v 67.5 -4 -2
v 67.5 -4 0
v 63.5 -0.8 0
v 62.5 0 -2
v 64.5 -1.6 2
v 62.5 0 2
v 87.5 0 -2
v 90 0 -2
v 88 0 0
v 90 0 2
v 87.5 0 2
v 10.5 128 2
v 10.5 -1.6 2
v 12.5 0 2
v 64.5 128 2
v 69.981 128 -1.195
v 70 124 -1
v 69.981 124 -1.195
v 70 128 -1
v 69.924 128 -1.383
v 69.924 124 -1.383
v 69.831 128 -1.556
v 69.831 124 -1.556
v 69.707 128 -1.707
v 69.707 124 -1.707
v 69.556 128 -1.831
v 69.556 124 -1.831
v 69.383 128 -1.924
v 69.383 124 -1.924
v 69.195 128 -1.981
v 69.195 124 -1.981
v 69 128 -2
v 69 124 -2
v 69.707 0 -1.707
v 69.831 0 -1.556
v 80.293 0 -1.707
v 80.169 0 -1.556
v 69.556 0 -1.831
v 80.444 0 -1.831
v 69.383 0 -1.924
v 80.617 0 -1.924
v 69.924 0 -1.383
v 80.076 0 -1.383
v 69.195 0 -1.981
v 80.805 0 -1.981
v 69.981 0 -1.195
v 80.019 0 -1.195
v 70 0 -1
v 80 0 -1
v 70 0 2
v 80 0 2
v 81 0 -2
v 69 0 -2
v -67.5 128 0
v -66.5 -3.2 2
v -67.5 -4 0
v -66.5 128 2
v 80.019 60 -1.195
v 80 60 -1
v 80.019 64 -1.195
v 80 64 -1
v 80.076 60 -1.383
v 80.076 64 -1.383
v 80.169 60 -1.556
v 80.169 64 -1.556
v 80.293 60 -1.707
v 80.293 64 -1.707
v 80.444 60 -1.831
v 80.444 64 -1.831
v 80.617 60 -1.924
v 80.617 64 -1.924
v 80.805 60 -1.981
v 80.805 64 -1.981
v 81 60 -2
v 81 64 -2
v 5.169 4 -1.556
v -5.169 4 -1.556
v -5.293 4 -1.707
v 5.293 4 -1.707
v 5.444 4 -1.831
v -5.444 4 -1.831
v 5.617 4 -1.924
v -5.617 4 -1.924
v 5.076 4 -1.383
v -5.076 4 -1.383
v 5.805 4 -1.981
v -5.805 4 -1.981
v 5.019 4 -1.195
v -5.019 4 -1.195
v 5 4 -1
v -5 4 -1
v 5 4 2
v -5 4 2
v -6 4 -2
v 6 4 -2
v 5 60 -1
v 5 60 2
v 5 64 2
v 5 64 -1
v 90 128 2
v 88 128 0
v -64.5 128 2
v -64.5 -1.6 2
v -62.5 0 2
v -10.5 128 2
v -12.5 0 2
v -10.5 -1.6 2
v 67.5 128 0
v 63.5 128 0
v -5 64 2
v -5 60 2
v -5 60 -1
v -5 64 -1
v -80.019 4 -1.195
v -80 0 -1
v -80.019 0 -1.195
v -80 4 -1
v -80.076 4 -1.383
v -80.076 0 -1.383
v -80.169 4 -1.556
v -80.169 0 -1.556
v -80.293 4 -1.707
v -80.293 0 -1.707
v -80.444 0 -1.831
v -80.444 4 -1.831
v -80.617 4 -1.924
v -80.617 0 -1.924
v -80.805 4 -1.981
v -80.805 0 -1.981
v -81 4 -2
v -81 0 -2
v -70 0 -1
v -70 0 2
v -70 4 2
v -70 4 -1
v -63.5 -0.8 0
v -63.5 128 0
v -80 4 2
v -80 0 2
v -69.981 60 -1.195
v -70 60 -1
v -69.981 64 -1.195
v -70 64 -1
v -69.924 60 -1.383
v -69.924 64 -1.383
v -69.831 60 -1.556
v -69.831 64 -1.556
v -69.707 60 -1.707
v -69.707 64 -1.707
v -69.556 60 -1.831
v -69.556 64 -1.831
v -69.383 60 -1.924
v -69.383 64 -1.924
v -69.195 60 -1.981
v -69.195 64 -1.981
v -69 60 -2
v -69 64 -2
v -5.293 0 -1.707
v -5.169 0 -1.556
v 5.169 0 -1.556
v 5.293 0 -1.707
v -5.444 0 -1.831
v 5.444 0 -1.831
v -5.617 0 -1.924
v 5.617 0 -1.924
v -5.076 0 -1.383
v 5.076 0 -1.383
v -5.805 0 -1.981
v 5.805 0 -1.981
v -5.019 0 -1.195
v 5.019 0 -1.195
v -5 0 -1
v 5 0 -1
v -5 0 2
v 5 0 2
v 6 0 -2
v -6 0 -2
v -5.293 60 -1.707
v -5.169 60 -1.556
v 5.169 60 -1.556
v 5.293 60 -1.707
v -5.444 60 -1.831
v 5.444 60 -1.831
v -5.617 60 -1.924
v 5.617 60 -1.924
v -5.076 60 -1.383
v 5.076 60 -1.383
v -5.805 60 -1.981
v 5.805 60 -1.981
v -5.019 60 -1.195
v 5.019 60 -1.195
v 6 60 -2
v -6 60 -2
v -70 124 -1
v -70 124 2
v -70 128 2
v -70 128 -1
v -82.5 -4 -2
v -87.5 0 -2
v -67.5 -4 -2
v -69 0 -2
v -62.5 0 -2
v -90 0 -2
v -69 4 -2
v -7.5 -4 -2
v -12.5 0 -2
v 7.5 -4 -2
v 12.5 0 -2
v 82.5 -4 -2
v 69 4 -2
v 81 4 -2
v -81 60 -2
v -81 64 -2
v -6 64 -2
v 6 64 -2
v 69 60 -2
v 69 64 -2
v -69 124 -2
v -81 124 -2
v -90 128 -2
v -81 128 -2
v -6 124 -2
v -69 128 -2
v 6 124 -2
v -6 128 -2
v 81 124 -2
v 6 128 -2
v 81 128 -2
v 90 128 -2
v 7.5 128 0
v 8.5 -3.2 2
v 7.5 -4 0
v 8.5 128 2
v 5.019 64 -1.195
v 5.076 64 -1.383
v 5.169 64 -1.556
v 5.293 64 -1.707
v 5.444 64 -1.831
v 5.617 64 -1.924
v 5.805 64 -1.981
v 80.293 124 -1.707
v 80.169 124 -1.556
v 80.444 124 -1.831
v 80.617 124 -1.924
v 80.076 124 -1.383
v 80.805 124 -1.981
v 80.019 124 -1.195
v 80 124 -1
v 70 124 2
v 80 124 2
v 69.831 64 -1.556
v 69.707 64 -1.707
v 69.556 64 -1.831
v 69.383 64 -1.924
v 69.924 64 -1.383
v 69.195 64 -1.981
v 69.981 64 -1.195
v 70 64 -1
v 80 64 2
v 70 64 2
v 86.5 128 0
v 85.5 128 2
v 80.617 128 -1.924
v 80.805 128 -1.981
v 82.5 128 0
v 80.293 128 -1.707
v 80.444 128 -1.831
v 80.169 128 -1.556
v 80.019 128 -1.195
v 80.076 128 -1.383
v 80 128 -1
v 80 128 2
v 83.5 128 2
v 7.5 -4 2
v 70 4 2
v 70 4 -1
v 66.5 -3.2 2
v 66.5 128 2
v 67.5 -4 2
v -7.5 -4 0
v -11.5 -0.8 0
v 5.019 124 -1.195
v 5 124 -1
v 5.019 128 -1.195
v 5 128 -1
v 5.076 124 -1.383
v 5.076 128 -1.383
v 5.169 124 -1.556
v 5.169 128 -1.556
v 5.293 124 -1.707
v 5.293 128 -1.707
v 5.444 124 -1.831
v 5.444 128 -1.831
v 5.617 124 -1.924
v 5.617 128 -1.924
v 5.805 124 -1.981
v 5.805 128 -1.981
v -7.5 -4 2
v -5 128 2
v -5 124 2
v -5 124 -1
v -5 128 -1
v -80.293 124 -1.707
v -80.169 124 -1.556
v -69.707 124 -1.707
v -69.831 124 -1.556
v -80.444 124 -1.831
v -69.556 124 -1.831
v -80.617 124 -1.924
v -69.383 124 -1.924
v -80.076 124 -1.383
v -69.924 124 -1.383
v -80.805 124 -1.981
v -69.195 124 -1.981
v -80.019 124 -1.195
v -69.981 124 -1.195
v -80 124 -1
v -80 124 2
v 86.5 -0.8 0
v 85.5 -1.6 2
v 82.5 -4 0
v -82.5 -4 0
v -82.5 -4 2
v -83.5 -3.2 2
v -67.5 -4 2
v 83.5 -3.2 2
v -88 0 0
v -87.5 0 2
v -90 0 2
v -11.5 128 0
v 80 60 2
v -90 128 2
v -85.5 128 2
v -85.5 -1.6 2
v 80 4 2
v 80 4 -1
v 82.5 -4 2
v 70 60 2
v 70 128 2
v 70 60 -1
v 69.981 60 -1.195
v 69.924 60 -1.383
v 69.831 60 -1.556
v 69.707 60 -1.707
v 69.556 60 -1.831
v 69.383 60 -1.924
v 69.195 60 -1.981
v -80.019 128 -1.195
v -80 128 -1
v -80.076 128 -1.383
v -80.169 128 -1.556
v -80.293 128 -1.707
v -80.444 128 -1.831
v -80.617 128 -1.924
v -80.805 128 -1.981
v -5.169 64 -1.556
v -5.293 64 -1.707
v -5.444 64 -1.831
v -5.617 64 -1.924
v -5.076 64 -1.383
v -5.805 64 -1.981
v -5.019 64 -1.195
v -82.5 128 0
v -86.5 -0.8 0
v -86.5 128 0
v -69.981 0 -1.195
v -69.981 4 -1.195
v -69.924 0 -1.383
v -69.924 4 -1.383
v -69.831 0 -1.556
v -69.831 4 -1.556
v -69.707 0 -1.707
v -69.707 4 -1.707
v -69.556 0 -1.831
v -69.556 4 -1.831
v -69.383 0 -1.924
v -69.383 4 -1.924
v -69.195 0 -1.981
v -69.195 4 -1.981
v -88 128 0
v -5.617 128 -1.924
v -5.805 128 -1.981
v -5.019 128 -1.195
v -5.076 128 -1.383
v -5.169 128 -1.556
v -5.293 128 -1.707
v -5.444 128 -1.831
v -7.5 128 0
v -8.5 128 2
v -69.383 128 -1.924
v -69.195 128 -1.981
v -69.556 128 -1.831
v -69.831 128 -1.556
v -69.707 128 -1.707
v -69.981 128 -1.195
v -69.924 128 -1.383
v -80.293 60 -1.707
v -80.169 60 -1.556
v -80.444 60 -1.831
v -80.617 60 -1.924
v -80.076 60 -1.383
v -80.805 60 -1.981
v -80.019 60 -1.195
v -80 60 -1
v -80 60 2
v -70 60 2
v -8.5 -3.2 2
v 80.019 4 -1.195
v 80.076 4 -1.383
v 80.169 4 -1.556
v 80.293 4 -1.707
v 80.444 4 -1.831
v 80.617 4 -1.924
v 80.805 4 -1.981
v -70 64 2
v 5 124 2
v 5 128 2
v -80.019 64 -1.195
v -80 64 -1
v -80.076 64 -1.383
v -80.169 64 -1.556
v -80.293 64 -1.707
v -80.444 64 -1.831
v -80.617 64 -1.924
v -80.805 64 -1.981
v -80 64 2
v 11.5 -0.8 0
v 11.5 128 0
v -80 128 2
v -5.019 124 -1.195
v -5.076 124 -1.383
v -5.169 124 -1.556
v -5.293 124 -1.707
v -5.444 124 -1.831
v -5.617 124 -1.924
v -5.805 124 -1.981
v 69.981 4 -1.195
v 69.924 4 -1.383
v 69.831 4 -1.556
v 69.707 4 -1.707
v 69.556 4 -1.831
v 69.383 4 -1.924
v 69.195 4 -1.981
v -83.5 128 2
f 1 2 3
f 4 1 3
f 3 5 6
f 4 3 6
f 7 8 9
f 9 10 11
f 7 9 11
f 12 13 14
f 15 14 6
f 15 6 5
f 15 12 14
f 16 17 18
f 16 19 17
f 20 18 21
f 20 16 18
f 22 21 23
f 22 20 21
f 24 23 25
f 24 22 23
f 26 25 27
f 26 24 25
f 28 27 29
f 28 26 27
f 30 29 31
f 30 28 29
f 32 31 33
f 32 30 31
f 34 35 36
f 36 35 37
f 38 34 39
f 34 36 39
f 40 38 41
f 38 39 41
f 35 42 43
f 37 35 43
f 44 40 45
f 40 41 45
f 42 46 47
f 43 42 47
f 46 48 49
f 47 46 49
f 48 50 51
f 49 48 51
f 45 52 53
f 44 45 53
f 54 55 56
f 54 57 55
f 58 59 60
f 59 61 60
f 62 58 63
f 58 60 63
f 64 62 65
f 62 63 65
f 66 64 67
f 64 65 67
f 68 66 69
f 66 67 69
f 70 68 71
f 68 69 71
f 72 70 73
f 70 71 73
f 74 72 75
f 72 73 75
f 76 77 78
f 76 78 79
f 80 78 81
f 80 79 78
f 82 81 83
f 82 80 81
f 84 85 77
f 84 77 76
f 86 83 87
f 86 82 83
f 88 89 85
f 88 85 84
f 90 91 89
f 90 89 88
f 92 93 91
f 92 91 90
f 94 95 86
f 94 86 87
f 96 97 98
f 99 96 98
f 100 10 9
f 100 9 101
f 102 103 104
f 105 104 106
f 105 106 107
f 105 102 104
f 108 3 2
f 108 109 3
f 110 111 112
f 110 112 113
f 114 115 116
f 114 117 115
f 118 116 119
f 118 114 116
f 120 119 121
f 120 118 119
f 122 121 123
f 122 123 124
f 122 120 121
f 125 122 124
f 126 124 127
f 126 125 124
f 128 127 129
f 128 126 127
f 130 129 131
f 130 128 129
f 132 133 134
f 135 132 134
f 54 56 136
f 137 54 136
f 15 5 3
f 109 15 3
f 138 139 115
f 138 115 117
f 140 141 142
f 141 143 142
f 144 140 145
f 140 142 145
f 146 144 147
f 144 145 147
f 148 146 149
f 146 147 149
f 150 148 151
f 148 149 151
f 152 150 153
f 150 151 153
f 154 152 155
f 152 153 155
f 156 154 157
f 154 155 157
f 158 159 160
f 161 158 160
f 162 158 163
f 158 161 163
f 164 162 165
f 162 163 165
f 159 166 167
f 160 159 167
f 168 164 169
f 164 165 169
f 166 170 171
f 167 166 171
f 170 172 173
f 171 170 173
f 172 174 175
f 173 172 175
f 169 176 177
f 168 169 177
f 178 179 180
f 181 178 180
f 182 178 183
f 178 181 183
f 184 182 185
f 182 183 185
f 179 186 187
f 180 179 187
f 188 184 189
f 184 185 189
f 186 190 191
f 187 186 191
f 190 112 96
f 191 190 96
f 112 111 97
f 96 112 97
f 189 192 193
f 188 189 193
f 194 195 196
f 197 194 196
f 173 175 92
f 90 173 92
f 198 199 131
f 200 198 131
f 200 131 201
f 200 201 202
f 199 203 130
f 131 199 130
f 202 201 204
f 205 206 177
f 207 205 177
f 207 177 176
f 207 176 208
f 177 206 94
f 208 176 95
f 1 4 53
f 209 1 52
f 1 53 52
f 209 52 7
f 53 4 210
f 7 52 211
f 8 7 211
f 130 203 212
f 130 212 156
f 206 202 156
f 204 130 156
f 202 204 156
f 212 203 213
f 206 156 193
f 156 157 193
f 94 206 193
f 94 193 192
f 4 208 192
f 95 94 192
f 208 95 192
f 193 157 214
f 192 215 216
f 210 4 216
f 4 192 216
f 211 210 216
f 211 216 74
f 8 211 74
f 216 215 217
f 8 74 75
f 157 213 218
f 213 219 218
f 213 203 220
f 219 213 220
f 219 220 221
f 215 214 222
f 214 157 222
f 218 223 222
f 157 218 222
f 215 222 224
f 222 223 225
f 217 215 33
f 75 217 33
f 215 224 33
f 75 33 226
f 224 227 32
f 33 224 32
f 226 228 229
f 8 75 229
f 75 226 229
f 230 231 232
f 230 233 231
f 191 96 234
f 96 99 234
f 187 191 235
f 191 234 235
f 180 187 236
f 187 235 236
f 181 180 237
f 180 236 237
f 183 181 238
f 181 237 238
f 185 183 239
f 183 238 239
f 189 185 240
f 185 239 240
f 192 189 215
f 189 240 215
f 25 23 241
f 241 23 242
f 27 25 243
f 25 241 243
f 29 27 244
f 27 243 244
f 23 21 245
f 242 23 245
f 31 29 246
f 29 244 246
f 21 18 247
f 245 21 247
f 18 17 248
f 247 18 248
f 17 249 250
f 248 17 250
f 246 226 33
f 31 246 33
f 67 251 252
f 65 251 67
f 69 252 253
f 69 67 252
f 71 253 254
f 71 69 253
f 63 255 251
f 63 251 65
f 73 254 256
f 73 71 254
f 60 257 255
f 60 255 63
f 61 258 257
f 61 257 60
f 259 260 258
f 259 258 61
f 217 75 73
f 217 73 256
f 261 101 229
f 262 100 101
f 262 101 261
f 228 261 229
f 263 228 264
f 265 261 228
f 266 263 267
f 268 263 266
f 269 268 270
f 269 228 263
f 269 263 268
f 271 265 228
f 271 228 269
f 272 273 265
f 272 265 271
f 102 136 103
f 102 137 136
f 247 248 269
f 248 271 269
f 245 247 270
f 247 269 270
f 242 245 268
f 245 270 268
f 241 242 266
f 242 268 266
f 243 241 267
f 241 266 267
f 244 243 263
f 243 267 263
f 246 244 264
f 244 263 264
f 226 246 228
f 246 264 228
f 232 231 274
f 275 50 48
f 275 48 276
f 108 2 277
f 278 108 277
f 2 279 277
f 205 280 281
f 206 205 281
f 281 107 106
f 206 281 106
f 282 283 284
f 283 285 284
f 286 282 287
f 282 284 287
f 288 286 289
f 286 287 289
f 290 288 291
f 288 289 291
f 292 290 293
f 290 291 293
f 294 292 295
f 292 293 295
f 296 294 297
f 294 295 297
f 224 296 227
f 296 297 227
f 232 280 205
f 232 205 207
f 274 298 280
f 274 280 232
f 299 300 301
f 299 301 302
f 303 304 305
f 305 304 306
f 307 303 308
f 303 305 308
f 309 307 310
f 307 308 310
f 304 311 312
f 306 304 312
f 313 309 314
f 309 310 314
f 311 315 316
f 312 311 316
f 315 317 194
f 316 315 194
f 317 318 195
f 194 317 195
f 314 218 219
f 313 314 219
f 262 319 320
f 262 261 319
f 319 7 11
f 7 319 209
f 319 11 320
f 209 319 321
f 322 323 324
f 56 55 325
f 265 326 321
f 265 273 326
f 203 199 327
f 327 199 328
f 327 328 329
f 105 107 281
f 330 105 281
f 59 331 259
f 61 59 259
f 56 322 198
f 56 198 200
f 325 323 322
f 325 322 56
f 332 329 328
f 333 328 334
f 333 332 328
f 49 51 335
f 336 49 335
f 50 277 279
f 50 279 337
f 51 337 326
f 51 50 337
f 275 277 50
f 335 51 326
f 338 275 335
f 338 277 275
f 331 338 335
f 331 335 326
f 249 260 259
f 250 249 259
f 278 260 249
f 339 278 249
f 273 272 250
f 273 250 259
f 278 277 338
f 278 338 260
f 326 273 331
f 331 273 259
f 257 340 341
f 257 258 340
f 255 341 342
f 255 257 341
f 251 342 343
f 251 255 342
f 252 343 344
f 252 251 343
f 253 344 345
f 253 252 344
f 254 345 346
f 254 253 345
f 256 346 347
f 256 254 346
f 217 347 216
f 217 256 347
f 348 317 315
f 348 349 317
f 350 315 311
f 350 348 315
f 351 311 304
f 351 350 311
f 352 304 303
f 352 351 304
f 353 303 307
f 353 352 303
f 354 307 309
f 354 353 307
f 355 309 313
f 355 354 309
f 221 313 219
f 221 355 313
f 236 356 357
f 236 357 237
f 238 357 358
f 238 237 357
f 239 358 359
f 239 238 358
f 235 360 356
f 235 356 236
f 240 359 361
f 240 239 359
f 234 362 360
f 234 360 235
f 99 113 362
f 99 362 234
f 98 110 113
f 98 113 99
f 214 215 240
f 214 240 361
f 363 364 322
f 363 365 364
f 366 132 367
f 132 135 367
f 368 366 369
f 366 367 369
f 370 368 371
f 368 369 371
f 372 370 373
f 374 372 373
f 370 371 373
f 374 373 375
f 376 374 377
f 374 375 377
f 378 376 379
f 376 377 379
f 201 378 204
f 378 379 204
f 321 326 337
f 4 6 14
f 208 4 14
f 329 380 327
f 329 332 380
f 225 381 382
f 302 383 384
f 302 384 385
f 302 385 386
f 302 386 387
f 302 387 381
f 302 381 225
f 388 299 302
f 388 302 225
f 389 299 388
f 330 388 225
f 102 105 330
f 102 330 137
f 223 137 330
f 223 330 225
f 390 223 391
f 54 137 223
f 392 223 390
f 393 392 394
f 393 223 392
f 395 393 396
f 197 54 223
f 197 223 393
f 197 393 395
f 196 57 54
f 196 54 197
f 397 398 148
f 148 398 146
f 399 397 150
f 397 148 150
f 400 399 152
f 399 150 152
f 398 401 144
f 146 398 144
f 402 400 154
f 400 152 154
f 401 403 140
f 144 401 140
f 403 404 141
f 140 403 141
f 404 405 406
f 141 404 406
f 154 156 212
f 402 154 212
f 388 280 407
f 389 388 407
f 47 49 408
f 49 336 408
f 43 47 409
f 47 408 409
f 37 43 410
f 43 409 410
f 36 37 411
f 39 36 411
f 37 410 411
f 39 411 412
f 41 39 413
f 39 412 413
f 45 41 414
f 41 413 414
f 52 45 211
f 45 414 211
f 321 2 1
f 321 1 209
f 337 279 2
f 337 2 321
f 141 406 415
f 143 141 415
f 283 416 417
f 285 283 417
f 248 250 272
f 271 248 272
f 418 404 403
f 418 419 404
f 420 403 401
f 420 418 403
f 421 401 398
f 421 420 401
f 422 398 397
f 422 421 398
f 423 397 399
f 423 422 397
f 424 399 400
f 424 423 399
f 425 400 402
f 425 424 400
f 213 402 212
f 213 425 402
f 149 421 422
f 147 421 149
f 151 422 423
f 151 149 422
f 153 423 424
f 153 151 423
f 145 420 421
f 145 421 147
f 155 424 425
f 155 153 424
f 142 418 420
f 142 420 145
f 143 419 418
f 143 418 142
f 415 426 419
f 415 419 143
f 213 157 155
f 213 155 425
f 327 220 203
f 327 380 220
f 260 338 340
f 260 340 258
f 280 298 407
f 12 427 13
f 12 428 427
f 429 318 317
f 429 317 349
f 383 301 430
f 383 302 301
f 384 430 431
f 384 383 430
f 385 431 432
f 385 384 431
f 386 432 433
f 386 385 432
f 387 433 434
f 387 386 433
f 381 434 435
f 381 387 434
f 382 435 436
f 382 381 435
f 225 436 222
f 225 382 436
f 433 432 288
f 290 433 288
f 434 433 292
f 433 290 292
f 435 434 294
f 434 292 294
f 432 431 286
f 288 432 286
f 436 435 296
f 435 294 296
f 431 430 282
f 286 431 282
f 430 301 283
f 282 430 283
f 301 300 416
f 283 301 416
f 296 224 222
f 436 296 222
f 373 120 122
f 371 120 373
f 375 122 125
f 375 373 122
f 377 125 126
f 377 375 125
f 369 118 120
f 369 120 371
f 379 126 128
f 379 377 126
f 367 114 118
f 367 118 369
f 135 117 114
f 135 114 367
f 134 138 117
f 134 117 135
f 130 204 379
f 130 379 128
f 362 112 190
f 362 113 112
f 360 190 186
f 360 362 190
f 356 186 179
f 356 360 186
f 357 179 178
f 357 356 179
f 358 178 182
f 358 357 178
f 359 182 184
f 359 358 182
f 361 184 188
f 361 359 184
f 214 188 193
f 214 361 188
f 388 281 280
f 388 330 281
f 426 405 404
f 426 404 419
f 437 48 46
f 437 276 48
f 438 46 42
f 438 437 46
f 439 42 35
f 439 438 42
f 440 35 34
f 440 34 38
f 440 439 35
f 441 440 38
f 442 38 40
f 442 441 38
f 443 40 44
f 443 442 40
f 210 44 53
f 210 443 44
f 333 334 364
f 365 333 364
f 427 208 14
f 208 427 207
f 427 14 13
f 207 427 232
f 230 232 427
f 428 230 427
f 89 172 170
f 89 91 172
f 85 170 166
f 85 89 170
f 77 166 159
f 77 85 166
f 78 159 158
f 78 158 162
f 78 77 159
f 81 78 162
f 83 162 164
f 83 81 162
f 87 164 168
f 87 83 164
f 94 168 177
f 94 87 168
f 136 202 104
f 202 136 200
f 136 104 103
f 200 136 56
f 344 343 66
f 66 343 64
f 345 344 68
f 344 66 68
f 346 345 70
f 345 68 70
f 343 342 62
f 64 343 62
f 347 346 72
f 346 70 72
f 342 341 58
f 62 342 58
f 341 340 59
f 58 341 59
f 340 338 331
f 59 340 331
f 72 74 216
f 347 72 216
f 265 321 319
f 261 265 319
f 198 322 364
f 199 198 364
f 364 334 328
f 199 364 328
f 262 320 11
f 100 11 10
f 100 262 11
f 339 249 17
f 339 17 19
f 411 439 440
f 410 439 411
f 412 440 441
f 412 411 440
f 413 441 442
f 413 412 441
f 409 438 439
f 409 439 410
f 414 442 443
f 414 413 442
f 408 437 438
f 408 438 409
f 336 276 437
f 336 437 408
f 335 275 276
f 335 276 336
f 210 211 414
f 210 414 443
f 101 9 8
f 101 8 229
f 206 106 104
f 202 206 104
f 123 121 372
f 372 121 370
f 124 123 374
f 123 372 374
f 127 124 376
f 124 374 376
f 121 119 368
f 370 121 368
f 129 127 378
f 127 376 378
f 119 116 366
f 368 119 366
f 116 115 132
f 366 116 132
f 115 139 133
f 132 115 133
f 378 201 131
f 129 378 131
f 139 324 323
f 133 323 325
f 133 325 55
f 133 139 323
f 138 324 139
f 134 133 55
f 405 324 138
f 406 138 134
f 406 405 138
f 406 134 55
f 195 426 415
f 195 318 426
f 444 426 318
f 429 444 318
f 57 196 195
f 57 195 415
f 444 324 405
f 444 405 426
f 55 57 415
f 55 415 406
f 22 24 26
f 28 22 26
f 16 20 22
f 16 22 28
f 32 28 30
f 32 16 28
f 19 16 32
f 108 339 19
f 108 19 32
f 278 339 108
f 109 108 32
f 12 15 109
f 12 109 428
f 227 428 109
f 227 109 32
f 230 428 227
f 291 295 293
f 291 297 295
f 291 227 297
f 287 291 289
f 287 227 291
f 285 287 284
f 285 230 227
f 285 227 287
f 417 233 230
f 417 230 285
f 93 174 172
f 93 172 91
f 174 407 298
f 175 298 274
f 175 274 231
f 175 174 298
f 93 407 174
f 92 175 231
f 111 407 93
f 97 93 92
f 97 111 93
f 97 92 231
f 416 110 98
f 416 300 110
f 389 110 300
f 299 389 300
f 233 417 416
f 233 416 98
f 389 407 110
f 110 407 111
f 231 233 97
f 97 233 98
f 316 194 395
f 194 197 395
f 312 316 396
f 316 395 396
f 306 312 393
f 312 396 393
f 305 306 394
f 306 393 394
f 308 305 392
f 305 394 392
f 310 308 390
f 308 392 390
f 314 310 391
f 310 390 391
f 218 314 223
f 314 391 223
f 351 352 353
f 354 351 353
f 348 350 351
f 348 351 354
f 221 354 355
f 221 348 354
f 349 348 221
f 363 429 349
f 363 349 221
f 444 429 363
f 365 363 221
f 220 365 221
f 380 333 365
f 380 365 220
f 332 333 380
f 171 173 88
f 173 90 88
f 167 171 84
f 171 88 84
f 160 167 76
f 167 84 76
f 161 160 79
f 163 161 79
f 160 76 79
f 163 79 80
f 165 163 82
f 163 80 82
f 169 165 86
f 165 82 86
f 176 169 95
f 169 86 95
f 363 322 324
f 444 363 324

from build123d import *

# Parameters (mm, degrees)
SKETCH005_W          = 180
SKETCH005_H          = 132
SKETCH003_W          = 176
SKETCH003_H          = 132
SKETCH004_W          = 180
SKETCH004_H          = 132
SKETCH_W             = 10
SKETCH_H             = 4
POCKET_DEPTH         = 2.001
POCKET_DEPTH_BACK    = 2.001
SKETCH001_W          = 10
SKETCH001_H          = 4
POCKET001_DEPTH      = 2.001
POCKET001_DEPTH_BACK = 2.001
SKETCH002_W          = 10
SKETCH002_H          = 4
POCKET002_DEPTH      = 2.001
POCKET002_DEPTH_BACK = 2.001
POCKET003_DEPTH      = 128.001
POCKET003_DEPTH_BACK = 4.001
POCKET004_DEPTH      = 128.001
POCKET004_DEPTH_BACK = 4.001
POCKET005_DEPTH      = 128.001
POCKET005_DEPTH_BACK = 4.001
FILLET_R             = 1
POCKET006_DEPTH      = 2.001
POCKET006_DEPTH_BACK = 2.001


with BuildPart() as part:
    # Sketch005 (on DatumPlane) → AdditiveLoft section 0
    with BuildSketch(Plane.XY.offset(-2)):
        with Locations((0, 62)):
            Rectangle(SKETCH005_W, SKETCH005_H)
    # Sketch003 → AdditiveLoft section 1
    with BuildSketch(Plane.XY):
        with Locations((0, 62)):
            Rectangle(SKETCH003_W, SKETCH003_H)
    # Sketch004 (on DatumPlane) → AdditiveLoft section 2
    with BuildSketch(Plane.XY.offset(2)):
        with Locations((0, 62)):
            Rectangle(SKETCH004_W, SKETCH004_H)
    loft(ruled=True)

    # Sketch → Pocket (cut, two sides)
    with BuildSketch(Plane.XY) as pocket_sk:
        with Locations((-75, 2)):
            Rectangle(SKETCH_W, SKETCH_H)
        with Locations((0, 2)):
            Rectangle(SKETCH_W, SKETCH_H)
        with Locations((75, 2)):
            Rectangle(SKETCH_W, SKETCH_H)
    extrude(amount=-POCKET_DEPTH, mode=Mode.SUBTRACT)
    extrude(pocket_sk.sketch, amount=POCKET_DEPTH_BACK, mode=Mode.SUBTRACT)

    # Sketch001 (on DatumPlane) → Pocket001 (cut, two sides)
    with BuildSketch(Plane(origin=(0, 60, 0), x_dir=(1, 0, 0), z_dir=(0, 0, 1))) as pocket001_sk:
        with Locations((-75, 2)):
            Rectangle(SKETCH001_W, SKETCH001_H)
        with Locations((0, 2)):
            Rectangle(SKETCH001_W, SKETCH001_H)
        with Locations((75, 2)):
            Rectangle(SKETCH001_W, SKETCH001_H)
    extrude(amount=-POCKET001_DEPTH, mode=Mode.SUBTRACT)
    extrude(pocket001_sk.sketch, amount=POCKET001_DEPTH_BACK, mode=Mode.SUBTRACT)

    # Sketch002 (on DatumPlane) → Pocket002 (cut, two sides)
    with BuildSketch(Plane(origin=(0, 124, 0), x_dir=(1, 0, 0), z_dir=(0, 0, 1))) as pocket002_sk:
        with Locations((-75, 2)):
            Rectangle(SKETCH002_W, SKETCH002_H)
        with Locations((0, 2)):
            Rectangle(SKETCH002_W, SKETCH002_H)
        with Locations((75, 2)):
            Rectangle(SKETCH002_W, SKETCH002_H)
    extrude(amount=-POCKET002_DEPTH, mode=Mode.SUBTRACT)
    extrude(pocket002_sk.sketch, amount=POCKET002_DEPTH_BACK, mode=Mode.SUBTRACT)

    # Sketch006 → Pocket003 (cut, two sides)
    with BuildSketch(Plane.XZ) as pocket003_sk:
        Polygon((-11.5, 0), (-7.5, 0), (-8.5, 2), (-10.5, 2), align=None)
        Polygon((7.5, 0), (11.5, 0), (10.5, 2), (8.5, 2), align=None)
    extrude(amount=-POCKET003_DEPTH, mode=Mode.SUBTRACT)
    extrude(pocket003_sk.sketch, amount=POCKET003_DEPTH_BACK, mode=Mode.SUBTRACT)

    # Sketch007 (on DatumPlane) → Pocket004 (cut, two sides)
    with BuildSketch(Plane(origin=(-75, 0, 0), x_dir=(1, 0, 0), z_dir=(0, -1, 0))) as pocket004_sk:
        Polygon((-11.5, 0), (-7.5, 0), (-8.5, 2), (-10.5, 2), align=None)
        Polygon((7.5, 0), (11.5, 0), (10.5, 2), (8.5, 2), align=None)
    extrude(amount=-POCKET004_DEPTH, mode=Mode.SUBTRACT)
    extrude(pocket004_sk.sketch, amount=POCKET004_DEPTH_BACK, mode=Mode.SUBTRACT)

    # Sketch008 (on DatumPlane) → Pocket005 (cut, two sides)
    with BuildSketch(Plane(origin=(75, 0, 0), x_dir=(1, 0, 0), z_dir=(0, -1, 0))) as pocket005_sk:
        Polygon((-11.5, 0), (-7.5, 0), (-8.5, 2), (-10.5, 2), align=None)
        Polygon((7.5, 0), (11.5, 0), (10.5, 2), (8.5, 2), align=None)
    extrude(amount=-POCKET005_DEPTH, mode=Mode.SUBTRACT)
    extrude(pocket005_sk.sketch, amount=POCKET005_DEPTH_BACK, mode=Mode.SUBTRACT)

    # Fillet
    fillet_edges = [part.edges().sort_by_distance(p)[0] for p in [
        (-70, 2, -2),
        (-80, 2, -2),
        (-5, 2, -2),
        (5, 2, -2),
        (70, 2, -2),
        (80, 2, -2),
        (-80, 62, -2),
        (-70, 62, -2),
        (-5, 62, -2),
        (5, 62, -2),
        (70, 62, -2),
        (80, 62, -2),
        (-80, 126, -2),
        (-70, 126, -2),
        (-5, 126, -2),
        (5, 126, -2),
        (70, 126, -2),
        (80, 126, -2),
    ]]
    fillet(fillet_edges, radius=FILLET_R)

    # Sketch009 → Pocket006 (cut, two sides)
    with BuildSketch(Plane.XY) as pocket006_sk:
        Polygon((-100, 0), (-100, -20), (100, -20), (100, 0), (87.5, 0), (82.5, -4), (67.5, -4), (62.5, 0), (12.5, 0), (7.5, -4), (-7.5, -4), (-12.5, 0), (-62.5, 0), (-67.5, -4), (-82.5, -4), (-87.5, 0), align=None)
    extrude(amount=-POCKET006_DEPTH, mode=Mode.SUBTRACT)
    extrude(pocket006_sk.sketch, amount=POCKET006_DEPTH_BACK, mode=Mode.SUBTRACT)


solid = part.part
